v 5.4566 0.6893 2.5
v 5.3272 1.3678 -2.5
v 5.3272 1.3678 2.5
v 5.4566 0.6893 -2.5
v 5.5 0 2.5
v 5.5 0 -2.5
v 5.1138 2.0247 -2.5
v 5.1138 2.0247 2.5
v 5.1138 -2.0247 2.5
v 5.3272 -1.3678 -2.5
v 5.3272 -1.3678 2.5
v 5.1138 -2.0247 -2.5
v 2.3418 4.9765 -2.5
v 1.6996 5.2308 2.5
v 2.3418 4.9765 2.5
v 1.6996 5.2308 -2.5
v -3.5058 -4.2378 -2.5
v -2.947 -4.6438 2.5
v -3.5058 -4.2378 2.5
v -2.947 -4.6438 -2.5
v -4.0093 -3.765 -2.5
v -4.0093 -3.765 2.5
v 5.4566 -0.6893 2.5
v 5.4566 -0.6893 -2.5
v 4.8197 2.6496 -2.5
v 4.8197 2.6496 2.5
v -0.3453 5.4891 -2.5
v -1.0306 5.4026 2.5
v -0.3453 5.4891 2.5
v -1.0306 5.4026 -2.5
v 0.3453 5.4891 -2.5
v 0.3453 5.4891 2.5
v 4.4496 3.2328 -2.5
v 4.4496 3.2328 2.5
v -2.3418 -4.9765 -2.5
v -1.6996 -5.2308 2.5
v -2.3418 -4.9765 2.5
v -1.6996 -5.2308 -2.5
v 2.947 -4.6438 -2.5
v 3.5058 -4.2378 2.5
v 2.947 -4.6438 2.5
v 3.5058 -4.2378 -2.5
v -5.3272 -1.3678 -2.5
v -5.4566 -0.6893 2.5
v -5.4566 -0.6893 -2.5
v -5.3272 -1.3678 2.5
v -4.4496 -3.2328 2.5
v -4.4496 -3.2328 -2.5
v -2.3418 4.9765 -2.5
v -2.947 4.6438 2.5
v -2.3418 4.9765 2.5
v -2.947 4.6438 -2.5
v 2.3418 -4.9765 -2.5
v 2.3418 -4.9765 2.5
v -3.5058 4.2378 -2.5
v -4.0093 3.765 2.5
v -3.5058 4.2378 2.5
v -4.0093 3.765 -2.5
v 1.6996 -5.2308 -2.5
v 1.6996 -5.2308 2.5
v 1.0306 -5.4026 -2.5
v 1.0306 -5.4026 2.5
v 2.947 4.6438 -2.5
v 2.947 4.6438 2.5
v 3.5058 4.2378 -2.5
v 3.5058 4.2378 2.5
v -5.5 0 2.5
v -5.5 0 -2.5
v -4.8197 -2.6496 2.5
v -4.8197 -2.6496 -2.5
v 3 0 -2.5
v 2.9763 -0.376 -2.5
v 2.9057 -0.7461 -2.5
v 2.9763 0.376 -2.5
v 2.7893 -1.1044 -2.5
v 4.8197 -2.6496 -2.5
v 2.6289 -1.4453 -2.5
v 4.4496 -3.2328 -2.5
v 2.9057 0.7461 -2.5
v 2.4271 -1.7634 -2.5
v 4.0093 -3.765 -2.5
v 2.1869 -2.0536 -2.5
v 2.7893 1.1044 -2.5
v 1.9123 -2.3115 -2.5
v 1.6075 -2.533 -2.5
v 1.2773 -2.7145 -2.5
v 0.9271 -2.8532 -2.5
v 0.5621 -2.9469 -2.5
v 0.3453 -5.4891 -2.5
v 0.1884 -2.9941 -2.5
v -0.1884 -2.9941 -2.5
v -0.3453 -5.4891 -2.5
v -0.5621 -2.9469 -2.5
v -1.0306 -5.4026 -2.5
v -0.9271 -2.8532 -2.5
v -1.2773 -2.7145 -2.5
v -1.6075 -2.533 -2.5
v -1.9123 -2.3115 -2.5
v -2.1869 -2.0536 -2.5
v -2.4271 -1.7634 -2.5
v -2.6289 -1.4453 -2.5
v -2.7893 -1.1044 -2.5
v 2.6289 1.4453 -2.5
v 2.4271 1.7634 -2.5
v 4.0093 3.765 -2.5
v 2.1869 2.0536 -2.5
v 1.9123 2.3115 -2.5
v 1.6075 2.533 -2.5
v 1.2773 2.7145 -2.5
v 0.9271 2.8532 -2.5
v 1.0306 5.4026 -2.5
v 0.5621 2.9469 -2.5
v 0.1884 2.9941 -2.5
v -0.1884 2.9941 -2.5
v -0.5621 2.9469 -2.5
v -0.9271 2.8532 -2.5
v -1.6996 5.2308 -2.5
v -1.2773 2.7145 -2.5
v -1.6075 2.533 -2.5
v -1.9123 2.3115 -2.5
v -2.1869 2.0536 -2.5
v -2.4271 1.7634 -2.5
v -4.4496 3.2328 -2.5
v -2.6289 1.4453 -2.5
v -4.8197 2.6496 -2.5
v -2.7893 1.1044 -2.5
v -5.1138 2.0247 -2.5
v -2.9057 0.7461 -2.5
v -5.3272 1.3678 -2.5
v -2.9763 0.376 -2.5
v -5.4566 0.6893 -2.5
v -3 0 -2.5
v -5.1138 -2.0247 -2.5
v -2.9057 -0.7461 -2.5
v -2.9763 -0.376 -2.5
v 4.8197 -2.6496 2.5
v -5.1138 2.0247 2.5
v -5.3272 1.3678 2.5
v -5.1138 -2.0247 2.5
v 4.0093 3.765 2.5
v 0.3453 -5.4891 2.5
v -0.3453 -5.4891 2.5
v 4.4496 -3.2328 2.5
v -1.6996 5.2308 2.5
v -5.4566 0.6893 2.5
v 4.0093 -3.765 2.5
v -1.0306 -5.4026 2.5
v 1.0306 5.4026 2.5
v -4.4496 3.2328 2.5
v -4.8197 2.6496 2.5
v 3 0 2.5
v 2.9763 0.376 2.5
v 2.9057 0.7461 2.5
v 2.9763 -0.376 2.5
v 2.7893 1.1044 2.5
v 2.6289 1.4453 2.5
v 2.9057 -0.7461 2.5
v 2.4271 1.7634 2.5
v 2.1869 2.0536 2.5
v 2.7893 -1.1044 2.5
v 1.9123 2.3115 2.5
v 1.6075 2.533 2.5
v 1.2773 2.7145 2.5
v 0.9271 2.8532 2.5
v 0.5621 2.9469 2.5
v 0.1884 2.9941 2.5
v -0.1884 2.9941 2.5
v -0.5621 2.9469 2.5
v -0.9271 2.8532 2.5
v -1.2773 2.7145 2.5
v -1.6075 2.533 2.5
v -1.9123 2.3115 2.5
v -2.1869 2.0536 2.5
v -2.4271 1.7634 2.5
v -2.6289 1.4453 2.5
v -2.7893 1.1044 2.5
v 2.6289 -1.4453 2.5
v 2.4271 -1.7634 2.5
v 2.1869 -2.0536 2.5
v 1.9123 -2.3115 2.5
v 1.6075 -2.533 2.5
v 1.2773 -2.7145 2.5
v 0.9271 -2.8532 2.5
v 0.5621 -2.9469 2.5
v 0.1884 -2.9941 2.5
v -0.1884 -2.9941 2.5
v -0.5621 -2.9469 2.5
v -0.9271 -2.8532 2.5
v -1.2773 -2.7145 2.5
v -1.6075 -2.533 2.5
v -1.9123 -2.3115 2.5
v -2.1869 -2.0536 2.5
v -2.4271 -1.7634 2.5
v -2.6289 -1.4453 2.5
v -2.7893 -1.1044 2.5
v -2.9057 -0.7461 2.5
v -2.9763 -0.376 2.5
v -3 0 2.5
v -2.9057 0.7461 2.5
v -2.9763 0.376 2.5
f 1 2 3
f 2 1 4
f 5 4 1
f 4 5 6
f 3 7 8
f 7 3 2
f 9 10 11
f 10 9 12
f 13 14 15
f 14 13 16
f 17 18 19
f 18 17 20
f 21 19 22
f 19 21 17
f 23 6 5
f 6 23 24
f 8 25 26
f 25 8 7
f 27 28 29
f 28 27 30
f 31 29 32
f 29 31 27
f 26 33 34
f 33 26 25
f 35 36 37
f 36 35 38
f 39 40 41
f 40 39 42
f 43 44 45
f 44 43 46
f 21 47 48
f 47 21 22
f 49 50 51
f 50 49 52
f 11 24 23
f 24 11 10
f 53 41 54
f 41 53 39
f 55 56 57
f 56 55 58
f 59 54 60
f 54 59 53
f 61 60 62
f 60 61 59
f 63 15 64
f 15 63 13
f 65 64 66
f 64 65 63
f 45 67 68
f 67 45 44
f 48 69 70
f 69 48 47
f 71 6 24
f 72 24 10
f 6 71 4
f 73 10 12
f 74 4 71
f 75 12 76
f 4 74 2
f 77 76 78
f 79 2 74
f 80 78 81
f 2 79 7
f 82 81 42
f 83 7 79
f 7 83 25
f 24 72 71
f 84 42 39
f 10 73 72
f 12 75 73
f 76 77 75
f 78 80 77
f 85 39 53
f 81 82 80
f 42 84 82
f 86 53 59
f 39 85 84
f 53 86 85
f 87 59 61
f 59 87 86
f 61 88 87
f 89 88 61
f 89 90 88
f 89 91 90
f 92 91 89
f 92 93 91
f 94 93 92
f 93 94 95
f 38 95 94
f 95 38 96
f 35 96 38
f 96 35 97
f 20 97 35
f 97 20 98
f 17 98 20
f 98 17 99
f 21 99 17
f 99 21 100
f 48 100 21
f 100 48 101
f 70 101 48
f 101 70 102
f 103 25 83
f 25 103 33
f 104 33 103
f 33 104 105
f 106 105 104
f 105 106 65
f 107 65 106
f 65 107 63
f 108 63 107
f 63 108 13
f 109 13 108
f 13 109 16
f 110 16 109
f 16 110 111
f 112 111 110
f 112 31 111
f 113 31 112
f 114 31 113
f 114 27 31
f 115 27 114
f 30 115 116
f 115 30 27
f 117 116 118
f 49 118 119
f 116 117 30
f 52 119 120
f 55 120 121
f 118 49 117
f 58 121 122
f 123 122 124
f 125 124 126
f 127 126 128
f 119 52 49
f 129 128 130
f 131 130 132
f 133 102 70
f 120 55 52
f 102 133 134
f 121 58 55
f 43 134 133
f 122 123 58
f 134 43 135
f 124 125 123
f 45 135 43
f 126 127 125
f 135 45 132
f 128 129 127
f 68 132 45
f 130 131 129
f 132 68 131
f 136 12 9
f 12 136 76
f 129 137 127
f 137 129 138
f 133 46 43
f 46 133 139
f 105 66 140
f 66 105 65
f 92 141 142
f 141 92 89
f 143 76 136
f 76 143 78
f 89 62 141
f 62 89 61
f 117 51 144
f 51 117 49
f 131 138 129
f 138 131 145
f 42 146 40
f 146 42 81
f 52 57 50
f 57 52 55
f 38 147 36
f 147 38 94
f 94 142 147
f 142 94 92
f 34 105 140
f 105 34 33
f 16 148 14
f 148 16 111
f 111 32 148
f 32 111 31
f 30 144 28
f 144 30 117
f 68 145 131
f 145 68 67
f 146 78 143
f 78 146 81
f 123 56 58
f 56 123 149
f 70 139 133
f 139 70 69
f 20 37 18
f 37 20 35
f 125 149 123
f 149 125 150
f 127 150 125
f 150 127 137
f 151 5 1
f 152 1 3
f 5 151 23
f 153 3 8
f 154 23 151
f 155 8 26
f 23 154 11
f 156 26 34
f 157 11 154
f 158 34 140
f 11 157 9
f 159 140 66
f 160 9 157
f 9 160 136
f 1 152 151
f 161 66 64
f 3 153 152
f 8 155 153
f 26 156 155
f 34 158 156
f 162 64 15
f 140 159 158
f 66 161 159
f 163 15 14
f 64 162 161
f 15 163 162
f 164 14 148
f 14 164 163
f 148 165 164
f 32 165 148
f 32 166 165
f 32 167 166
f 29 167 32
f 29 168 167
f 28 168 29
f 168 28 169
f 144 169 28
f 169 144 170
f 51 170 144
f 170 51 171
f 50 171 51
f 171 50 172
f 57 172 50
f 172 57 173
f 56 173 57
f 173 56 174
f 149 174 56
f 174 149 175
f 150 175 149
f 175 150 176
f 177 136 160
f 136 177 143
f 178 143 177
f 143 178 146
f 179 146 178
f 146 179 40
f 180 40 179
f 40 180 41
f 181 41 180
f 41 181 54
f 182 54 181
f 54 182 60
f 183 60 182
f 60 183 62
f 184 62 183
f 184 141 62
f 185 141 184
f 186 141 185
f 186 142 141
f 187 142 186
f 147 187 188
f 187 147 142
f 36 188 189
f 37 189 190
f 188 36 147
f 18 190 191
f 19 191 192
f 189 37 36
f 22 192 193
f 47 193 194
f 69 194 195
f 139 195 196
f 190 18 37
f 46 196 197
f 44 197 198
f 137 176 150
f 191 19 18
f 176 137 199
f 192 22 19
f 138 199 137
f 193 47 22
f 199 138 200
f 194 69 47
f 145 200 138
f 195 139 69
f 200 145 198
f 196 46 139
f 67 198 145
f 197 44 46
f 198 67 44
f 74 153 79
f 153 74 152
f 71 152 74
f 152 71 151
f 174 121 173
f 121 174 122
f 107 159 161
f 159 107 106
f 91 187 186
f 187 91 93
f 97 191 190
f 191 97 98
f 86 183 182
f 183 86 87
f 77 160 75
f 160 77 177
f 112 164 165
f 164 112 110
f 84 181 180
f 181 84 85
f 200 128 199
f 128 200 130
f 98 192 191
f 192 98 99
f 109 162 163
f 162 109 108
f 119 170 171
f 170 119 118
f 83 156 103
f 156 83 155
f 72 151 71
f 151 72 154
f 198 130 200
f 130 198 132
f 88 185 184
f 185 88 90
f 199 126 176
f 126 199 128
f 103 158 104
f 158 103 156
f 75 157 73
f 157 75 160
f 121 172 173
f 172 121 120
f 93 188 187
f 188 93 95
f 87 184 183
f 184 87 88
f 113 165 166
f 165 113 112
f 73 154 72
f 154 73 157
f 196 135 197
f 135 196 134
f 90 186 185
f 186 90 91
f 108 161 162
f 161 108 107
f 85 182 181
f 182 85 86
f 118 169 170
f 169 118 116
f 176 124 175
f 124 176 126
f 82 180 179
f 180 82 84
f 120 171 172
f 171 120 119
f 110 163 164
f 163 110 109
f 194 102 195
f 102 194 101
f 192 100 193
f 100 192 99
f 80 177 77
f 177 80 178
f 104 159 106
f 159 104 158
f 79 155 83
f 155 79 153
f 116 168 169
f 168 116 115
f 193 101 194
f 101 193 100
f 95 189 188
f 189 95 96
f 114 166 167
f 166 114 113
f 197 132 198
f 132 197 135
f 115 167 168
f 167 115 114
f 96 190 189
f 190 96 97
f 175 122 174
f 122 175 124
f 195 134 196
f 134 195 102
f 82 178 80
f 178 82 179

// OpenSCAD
$fn = 50;


difference() {
	union() {
		translate(v = [0, 0, -2.5000000000]) {
			cylinder(h = 5, r = 5.5000000000);
		}
	}
	union() {
		translate(v = [0, 0, -100.0000000000]) {
			cylinder(h = 200, r = 3.0000000000);
		}
	}
}
